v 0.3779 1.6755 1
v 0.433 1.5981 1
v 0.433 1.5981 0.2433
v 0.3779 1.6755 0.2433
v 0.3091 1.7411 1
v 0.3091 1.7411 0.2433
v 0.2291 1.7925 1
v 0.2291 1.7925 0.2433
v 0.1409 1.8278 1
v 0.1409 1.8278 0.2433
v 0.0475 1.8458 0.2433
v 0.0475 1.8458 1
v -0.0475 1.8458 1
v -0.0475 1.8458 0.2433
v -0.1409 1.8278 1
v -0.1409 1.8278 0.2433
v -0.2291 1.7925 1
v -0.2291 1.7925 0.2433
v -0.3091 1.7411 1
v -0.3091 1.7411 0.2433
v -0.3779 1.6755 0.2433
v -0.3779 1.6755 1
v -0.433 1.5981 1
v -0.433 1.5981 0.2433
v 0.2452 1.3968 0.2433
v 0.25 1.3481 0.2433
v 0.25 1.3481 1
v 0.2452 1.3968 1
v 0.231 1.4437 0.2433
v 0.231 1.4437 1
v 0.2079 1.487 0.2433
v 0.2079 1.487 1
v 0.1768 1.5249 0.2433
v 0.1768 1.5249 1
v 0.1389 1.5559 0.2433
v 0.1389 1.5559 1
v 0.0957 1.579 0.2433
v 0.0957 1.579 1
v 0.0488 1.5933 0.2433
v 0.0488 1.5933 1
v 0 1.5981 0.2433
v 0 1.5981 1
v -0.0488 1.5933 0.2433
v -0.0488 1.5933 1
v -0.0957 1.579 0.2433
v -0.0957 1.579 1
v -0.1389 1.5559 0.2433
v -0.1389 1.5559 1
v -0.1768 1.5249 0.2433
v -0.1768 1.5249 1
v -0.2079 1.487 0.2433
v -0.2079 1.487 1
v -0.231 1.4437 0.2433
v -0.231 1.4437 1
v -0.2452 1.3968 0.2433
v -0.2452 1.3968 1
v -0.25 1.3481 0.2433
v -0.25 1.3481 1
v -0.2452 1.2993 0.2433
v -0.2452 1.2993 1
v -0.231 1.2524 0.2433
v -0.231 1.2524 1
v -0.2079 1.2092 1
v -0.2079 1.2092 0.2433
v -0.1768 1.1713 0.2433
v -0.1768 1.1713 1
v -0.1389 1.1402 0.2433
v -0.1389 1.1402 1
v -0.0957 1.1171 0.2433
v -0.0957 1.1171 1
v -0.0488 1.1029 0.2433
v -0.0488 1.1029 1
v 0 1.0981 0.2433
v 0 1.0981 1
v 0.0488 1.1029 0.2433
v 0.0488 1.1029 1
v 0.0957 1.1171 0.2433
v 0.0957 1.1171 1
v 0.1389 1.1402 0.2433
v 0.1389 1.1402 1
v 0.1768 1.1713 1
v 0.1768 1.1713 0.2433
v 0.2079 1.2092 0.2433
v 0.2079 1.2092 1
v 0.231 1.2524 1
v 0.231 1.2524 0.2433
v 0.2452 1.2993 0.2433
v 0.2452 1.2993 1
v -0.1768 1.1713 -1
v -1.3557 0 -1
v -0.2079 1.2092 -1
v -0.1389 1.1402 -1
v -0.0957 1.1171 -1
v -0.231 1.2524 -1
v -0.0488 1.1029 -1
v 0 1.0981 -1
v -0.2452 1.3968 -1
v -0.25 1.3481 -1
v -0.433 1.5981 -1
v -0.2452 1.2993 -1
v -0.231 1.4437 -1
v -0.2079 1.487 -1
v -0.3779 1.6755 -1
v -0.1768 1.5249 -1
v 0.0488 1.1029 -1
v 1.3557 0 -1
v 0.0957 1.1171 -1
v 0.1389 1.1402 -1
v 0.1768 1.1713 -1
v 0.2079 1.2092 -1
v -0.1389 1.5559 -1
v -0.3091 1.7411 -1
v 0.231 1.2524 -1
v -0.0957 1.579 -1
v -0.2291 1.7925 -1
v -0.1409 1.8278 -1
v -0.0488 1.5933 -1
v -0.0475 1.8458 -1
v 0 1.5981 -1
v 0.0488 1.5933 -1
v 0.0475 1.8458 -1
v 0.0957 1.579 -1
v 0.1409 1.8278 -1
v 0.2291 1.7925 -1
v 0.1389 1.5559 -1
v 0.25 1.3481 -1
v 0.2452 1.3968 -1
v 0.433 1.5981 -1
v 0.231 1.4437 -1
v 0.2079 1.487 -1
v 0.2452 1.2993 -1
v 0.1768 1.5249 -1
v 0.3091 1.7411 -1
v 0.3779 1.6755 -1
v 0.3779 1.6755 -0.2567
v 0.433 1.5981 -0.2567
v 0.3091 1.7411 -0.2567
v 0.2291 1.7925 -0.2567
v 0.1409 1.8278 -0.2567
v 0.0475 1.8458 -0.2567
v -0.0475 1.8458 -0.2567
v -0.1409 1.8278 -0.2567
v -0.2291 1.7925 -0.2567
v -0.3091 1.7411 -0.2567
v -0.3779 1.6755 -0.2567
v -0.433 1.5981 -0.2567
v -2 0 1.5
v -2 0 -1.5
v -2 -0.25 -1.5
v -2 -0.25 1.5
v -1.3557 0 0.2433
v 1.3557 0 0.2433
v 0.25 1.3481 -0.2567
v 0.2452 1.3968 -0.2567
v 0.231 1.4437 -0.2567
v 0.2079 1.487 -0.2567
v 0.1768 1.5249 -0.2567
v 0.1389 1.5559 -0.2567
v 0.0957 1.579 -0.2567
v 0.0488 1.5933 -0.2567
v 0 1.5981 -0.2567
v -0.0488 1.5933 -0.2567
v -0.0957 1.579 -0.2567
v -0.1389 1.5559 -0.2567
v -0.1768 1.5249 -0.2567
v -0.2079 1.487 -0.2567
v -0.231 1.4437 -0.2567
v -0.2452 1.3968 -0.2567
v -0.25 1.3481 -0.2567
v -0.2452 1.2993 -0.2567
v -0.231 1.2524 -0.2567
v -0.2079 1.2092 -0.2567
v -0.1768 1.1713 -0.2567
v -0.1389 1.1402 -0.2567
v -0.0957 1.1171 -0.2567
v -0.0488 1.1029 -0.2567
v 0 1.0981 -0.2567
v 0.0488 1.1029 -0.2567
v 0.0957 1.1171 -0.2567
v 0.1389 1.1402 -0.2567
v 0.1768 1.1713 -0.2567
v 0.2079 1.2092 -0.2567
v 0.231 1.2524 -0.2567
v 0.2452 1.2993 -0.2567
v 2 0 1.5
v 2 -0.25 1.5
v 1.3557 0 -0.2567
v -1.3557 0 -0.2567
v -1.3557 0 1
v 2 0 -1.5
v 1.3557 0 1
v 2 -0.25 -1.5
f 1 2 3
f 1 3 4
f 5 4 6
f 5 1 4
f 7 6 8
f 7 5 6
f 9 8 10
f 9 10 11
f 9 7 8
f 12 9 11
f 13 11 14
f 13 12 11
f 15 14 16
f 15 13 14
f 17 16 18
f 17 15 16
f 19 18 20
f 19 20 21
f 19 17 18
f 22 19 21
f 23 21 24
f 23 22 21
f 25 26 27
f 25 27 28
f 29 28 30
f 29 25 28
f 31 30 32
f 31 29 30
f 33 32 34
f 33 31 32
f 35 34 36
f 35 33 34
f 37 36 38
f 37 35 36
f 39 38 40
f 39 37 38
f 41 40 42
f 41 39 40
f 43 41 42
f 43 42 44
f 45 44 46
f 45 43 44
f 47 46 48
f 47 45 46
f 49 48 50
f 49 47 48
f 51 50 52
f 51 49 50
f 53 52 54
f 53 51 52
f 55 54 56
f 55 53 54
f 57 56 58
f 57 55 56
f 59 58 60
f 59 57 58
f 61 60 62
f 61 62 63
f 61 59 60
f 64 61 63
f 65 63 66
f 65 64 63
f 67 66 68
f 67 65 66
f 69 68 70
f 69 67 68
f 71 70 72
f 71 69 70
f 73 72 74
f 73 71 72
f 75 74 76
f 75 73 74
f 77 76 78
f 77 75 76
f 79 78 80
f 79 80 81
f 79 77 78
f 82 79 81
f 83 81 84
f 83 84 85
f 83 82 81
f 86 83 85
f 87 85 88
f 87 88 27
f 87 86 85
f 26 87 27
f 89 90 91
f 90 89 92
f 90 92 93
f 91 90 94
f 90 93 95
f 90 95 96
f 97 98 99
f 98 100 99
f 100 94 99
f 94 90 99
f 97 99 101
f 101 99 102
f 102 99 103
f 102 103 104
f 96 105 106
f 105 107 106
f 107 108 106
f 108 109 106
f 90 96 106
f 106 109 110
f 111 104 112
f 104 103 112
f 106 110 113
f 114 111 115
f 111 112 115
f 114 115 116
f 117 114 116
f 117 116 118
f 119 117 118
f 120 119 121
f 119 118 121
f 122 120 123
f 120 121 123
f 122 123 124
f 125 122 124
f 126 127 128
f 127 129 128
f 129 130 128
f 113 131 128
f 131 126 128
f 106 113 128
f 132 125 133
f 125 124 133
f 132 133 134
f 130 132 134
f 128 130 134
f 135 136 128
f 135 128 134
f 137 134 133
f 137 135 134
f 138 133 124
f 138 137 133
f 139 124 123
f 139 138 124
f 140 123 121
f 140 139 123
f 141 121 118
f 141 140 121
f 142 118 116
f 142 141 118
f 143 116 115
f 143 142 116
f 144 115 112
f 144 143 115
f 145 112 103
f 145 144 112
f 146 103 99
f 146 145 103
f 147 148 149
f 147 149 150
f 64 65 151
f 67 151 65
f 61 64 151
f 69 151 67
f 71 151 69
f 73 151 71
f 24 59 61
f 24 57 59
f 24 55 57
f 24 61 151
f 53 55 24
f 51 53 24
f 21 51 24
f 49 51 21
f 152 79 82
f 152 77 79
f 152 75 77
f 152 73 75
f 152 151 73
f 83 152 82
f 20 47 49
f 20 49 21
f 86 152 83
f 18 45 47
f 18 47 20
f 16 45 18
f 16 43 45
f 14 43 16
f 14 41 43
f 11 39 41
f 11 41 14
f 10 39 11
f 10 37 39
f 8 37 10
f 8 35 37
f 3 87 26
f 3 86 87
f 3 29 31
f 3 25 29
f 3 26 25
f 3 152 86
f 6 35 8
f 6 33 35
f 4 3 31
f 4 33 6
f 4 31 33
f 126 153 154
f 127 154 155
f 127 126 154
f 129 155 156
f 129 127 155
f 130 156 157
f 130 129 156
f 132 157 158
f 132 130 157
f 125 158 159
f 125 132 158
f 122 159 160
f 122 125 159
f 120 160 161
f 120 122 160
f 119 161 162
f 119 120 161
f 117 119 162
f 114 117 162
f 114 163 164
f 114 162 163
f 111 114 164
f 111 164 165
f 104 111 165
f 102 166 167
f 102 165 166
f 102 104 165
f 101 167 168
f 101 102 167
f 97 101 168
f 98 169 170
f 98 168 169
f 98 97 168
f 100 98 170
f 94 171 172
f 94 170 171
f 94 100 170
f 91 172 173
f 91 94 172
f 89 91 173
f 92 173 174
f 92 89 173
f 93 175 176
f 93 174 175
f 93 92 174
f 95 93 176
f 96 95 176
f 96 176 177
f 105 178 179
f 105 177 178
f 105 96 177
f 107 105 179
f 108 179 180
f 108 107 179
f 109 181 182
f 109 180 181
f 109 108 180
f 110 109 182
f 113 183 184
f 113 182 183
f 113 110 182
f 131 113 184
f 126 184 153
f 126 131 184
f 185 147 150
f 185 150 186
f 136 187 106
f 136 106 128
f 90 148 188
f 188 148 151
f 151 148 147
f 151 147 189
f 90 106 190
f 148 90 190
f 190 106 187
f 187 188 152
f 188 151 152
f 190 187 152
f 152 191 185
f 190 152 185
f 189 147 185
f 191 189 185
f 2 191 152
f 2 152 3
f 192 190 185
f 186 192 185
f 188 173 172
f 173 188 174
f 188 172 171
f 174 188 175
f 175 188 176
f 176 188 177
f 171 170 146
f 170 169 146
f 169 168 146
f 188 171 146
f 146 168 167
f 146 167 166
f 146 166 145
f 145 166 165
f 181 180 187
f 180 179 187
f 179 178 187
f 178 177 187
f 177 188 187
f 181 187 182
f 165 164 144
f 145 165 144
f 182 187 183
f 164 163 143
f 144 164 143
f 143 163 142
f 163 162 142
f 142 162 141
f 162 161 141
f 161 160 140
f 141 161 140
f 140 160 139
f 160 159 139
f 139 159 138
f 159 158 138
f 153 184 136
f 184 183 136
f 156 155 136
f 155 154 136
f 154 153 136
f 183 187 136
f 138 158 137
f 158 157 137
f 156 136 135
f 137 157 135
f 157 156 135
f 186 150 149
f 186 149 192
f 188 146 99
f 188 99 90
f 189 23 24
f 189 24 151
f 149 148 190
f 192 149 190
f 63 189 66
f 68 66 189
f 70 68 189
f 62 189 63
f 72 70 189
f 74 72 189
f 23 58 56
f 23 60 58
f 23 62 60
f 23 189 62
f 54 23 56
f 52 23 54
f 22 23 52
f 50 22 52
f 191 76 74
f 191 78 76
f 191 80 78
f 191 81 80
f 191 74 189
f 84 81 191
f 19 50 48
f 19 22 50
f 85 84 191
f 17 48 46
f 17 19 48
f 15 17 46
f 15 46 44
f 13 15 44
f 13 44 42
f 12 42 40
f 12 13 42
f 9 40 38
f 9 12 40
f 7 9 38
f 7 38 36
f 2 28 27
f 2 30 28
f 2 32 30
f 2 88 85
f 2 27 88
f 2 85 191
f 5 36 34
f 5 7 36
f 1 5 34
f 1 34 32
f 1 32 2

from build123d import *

# Parameters (mm, degrees)
F0_W     = 4
F0_H     = 3
F1_DEPTH = 0.25
F2_R     = 0.25
F3_DEPTH = 1
F4_W     = 2.05637
F4_H     = 0.5
F5_DEPTH = 12.5


with BuildPart() as f1:
    # F0 (on Front) → F1 (new body)
    with BuildSketch(Plane.XZ):
        Rectangle(F0_W, F0_H)
    extrude(amount=F1_DEPTH)

    # F2 (on Top) → F3 (join, symmetric)
    with BuildSketch(Plane.XY):
        with BuildLine():
            Line((-1.5, -0.25), (1.5, -0.25))
            Line((1.5, -0.25), (0.433013, 1.598076))
            ThreePointArc((0.433013, 1.598076), (0, 1.848076), (-0.433013, 1.598076))
            Line((-0.433013, 1.598076), (-1.5, -0.25))
        make_face()
        with Locations((0, 1.348076)):
            Circle(F2_R, mode=Mode.SUBTRACT)
    extrude(amount=F3_DEPTH, both=True)

    # F4 (on Right) → F5 (cut, symmetric)
    with BuildSketch(Plane.YZ):
        with Locations((1.028185, -0.006711)):
            Rectangle(F4_W, F4_H)
    extrude(amount=F5_DEPTH, both=True, mode=Mode.SUBTRACT)


solid = f1.part
